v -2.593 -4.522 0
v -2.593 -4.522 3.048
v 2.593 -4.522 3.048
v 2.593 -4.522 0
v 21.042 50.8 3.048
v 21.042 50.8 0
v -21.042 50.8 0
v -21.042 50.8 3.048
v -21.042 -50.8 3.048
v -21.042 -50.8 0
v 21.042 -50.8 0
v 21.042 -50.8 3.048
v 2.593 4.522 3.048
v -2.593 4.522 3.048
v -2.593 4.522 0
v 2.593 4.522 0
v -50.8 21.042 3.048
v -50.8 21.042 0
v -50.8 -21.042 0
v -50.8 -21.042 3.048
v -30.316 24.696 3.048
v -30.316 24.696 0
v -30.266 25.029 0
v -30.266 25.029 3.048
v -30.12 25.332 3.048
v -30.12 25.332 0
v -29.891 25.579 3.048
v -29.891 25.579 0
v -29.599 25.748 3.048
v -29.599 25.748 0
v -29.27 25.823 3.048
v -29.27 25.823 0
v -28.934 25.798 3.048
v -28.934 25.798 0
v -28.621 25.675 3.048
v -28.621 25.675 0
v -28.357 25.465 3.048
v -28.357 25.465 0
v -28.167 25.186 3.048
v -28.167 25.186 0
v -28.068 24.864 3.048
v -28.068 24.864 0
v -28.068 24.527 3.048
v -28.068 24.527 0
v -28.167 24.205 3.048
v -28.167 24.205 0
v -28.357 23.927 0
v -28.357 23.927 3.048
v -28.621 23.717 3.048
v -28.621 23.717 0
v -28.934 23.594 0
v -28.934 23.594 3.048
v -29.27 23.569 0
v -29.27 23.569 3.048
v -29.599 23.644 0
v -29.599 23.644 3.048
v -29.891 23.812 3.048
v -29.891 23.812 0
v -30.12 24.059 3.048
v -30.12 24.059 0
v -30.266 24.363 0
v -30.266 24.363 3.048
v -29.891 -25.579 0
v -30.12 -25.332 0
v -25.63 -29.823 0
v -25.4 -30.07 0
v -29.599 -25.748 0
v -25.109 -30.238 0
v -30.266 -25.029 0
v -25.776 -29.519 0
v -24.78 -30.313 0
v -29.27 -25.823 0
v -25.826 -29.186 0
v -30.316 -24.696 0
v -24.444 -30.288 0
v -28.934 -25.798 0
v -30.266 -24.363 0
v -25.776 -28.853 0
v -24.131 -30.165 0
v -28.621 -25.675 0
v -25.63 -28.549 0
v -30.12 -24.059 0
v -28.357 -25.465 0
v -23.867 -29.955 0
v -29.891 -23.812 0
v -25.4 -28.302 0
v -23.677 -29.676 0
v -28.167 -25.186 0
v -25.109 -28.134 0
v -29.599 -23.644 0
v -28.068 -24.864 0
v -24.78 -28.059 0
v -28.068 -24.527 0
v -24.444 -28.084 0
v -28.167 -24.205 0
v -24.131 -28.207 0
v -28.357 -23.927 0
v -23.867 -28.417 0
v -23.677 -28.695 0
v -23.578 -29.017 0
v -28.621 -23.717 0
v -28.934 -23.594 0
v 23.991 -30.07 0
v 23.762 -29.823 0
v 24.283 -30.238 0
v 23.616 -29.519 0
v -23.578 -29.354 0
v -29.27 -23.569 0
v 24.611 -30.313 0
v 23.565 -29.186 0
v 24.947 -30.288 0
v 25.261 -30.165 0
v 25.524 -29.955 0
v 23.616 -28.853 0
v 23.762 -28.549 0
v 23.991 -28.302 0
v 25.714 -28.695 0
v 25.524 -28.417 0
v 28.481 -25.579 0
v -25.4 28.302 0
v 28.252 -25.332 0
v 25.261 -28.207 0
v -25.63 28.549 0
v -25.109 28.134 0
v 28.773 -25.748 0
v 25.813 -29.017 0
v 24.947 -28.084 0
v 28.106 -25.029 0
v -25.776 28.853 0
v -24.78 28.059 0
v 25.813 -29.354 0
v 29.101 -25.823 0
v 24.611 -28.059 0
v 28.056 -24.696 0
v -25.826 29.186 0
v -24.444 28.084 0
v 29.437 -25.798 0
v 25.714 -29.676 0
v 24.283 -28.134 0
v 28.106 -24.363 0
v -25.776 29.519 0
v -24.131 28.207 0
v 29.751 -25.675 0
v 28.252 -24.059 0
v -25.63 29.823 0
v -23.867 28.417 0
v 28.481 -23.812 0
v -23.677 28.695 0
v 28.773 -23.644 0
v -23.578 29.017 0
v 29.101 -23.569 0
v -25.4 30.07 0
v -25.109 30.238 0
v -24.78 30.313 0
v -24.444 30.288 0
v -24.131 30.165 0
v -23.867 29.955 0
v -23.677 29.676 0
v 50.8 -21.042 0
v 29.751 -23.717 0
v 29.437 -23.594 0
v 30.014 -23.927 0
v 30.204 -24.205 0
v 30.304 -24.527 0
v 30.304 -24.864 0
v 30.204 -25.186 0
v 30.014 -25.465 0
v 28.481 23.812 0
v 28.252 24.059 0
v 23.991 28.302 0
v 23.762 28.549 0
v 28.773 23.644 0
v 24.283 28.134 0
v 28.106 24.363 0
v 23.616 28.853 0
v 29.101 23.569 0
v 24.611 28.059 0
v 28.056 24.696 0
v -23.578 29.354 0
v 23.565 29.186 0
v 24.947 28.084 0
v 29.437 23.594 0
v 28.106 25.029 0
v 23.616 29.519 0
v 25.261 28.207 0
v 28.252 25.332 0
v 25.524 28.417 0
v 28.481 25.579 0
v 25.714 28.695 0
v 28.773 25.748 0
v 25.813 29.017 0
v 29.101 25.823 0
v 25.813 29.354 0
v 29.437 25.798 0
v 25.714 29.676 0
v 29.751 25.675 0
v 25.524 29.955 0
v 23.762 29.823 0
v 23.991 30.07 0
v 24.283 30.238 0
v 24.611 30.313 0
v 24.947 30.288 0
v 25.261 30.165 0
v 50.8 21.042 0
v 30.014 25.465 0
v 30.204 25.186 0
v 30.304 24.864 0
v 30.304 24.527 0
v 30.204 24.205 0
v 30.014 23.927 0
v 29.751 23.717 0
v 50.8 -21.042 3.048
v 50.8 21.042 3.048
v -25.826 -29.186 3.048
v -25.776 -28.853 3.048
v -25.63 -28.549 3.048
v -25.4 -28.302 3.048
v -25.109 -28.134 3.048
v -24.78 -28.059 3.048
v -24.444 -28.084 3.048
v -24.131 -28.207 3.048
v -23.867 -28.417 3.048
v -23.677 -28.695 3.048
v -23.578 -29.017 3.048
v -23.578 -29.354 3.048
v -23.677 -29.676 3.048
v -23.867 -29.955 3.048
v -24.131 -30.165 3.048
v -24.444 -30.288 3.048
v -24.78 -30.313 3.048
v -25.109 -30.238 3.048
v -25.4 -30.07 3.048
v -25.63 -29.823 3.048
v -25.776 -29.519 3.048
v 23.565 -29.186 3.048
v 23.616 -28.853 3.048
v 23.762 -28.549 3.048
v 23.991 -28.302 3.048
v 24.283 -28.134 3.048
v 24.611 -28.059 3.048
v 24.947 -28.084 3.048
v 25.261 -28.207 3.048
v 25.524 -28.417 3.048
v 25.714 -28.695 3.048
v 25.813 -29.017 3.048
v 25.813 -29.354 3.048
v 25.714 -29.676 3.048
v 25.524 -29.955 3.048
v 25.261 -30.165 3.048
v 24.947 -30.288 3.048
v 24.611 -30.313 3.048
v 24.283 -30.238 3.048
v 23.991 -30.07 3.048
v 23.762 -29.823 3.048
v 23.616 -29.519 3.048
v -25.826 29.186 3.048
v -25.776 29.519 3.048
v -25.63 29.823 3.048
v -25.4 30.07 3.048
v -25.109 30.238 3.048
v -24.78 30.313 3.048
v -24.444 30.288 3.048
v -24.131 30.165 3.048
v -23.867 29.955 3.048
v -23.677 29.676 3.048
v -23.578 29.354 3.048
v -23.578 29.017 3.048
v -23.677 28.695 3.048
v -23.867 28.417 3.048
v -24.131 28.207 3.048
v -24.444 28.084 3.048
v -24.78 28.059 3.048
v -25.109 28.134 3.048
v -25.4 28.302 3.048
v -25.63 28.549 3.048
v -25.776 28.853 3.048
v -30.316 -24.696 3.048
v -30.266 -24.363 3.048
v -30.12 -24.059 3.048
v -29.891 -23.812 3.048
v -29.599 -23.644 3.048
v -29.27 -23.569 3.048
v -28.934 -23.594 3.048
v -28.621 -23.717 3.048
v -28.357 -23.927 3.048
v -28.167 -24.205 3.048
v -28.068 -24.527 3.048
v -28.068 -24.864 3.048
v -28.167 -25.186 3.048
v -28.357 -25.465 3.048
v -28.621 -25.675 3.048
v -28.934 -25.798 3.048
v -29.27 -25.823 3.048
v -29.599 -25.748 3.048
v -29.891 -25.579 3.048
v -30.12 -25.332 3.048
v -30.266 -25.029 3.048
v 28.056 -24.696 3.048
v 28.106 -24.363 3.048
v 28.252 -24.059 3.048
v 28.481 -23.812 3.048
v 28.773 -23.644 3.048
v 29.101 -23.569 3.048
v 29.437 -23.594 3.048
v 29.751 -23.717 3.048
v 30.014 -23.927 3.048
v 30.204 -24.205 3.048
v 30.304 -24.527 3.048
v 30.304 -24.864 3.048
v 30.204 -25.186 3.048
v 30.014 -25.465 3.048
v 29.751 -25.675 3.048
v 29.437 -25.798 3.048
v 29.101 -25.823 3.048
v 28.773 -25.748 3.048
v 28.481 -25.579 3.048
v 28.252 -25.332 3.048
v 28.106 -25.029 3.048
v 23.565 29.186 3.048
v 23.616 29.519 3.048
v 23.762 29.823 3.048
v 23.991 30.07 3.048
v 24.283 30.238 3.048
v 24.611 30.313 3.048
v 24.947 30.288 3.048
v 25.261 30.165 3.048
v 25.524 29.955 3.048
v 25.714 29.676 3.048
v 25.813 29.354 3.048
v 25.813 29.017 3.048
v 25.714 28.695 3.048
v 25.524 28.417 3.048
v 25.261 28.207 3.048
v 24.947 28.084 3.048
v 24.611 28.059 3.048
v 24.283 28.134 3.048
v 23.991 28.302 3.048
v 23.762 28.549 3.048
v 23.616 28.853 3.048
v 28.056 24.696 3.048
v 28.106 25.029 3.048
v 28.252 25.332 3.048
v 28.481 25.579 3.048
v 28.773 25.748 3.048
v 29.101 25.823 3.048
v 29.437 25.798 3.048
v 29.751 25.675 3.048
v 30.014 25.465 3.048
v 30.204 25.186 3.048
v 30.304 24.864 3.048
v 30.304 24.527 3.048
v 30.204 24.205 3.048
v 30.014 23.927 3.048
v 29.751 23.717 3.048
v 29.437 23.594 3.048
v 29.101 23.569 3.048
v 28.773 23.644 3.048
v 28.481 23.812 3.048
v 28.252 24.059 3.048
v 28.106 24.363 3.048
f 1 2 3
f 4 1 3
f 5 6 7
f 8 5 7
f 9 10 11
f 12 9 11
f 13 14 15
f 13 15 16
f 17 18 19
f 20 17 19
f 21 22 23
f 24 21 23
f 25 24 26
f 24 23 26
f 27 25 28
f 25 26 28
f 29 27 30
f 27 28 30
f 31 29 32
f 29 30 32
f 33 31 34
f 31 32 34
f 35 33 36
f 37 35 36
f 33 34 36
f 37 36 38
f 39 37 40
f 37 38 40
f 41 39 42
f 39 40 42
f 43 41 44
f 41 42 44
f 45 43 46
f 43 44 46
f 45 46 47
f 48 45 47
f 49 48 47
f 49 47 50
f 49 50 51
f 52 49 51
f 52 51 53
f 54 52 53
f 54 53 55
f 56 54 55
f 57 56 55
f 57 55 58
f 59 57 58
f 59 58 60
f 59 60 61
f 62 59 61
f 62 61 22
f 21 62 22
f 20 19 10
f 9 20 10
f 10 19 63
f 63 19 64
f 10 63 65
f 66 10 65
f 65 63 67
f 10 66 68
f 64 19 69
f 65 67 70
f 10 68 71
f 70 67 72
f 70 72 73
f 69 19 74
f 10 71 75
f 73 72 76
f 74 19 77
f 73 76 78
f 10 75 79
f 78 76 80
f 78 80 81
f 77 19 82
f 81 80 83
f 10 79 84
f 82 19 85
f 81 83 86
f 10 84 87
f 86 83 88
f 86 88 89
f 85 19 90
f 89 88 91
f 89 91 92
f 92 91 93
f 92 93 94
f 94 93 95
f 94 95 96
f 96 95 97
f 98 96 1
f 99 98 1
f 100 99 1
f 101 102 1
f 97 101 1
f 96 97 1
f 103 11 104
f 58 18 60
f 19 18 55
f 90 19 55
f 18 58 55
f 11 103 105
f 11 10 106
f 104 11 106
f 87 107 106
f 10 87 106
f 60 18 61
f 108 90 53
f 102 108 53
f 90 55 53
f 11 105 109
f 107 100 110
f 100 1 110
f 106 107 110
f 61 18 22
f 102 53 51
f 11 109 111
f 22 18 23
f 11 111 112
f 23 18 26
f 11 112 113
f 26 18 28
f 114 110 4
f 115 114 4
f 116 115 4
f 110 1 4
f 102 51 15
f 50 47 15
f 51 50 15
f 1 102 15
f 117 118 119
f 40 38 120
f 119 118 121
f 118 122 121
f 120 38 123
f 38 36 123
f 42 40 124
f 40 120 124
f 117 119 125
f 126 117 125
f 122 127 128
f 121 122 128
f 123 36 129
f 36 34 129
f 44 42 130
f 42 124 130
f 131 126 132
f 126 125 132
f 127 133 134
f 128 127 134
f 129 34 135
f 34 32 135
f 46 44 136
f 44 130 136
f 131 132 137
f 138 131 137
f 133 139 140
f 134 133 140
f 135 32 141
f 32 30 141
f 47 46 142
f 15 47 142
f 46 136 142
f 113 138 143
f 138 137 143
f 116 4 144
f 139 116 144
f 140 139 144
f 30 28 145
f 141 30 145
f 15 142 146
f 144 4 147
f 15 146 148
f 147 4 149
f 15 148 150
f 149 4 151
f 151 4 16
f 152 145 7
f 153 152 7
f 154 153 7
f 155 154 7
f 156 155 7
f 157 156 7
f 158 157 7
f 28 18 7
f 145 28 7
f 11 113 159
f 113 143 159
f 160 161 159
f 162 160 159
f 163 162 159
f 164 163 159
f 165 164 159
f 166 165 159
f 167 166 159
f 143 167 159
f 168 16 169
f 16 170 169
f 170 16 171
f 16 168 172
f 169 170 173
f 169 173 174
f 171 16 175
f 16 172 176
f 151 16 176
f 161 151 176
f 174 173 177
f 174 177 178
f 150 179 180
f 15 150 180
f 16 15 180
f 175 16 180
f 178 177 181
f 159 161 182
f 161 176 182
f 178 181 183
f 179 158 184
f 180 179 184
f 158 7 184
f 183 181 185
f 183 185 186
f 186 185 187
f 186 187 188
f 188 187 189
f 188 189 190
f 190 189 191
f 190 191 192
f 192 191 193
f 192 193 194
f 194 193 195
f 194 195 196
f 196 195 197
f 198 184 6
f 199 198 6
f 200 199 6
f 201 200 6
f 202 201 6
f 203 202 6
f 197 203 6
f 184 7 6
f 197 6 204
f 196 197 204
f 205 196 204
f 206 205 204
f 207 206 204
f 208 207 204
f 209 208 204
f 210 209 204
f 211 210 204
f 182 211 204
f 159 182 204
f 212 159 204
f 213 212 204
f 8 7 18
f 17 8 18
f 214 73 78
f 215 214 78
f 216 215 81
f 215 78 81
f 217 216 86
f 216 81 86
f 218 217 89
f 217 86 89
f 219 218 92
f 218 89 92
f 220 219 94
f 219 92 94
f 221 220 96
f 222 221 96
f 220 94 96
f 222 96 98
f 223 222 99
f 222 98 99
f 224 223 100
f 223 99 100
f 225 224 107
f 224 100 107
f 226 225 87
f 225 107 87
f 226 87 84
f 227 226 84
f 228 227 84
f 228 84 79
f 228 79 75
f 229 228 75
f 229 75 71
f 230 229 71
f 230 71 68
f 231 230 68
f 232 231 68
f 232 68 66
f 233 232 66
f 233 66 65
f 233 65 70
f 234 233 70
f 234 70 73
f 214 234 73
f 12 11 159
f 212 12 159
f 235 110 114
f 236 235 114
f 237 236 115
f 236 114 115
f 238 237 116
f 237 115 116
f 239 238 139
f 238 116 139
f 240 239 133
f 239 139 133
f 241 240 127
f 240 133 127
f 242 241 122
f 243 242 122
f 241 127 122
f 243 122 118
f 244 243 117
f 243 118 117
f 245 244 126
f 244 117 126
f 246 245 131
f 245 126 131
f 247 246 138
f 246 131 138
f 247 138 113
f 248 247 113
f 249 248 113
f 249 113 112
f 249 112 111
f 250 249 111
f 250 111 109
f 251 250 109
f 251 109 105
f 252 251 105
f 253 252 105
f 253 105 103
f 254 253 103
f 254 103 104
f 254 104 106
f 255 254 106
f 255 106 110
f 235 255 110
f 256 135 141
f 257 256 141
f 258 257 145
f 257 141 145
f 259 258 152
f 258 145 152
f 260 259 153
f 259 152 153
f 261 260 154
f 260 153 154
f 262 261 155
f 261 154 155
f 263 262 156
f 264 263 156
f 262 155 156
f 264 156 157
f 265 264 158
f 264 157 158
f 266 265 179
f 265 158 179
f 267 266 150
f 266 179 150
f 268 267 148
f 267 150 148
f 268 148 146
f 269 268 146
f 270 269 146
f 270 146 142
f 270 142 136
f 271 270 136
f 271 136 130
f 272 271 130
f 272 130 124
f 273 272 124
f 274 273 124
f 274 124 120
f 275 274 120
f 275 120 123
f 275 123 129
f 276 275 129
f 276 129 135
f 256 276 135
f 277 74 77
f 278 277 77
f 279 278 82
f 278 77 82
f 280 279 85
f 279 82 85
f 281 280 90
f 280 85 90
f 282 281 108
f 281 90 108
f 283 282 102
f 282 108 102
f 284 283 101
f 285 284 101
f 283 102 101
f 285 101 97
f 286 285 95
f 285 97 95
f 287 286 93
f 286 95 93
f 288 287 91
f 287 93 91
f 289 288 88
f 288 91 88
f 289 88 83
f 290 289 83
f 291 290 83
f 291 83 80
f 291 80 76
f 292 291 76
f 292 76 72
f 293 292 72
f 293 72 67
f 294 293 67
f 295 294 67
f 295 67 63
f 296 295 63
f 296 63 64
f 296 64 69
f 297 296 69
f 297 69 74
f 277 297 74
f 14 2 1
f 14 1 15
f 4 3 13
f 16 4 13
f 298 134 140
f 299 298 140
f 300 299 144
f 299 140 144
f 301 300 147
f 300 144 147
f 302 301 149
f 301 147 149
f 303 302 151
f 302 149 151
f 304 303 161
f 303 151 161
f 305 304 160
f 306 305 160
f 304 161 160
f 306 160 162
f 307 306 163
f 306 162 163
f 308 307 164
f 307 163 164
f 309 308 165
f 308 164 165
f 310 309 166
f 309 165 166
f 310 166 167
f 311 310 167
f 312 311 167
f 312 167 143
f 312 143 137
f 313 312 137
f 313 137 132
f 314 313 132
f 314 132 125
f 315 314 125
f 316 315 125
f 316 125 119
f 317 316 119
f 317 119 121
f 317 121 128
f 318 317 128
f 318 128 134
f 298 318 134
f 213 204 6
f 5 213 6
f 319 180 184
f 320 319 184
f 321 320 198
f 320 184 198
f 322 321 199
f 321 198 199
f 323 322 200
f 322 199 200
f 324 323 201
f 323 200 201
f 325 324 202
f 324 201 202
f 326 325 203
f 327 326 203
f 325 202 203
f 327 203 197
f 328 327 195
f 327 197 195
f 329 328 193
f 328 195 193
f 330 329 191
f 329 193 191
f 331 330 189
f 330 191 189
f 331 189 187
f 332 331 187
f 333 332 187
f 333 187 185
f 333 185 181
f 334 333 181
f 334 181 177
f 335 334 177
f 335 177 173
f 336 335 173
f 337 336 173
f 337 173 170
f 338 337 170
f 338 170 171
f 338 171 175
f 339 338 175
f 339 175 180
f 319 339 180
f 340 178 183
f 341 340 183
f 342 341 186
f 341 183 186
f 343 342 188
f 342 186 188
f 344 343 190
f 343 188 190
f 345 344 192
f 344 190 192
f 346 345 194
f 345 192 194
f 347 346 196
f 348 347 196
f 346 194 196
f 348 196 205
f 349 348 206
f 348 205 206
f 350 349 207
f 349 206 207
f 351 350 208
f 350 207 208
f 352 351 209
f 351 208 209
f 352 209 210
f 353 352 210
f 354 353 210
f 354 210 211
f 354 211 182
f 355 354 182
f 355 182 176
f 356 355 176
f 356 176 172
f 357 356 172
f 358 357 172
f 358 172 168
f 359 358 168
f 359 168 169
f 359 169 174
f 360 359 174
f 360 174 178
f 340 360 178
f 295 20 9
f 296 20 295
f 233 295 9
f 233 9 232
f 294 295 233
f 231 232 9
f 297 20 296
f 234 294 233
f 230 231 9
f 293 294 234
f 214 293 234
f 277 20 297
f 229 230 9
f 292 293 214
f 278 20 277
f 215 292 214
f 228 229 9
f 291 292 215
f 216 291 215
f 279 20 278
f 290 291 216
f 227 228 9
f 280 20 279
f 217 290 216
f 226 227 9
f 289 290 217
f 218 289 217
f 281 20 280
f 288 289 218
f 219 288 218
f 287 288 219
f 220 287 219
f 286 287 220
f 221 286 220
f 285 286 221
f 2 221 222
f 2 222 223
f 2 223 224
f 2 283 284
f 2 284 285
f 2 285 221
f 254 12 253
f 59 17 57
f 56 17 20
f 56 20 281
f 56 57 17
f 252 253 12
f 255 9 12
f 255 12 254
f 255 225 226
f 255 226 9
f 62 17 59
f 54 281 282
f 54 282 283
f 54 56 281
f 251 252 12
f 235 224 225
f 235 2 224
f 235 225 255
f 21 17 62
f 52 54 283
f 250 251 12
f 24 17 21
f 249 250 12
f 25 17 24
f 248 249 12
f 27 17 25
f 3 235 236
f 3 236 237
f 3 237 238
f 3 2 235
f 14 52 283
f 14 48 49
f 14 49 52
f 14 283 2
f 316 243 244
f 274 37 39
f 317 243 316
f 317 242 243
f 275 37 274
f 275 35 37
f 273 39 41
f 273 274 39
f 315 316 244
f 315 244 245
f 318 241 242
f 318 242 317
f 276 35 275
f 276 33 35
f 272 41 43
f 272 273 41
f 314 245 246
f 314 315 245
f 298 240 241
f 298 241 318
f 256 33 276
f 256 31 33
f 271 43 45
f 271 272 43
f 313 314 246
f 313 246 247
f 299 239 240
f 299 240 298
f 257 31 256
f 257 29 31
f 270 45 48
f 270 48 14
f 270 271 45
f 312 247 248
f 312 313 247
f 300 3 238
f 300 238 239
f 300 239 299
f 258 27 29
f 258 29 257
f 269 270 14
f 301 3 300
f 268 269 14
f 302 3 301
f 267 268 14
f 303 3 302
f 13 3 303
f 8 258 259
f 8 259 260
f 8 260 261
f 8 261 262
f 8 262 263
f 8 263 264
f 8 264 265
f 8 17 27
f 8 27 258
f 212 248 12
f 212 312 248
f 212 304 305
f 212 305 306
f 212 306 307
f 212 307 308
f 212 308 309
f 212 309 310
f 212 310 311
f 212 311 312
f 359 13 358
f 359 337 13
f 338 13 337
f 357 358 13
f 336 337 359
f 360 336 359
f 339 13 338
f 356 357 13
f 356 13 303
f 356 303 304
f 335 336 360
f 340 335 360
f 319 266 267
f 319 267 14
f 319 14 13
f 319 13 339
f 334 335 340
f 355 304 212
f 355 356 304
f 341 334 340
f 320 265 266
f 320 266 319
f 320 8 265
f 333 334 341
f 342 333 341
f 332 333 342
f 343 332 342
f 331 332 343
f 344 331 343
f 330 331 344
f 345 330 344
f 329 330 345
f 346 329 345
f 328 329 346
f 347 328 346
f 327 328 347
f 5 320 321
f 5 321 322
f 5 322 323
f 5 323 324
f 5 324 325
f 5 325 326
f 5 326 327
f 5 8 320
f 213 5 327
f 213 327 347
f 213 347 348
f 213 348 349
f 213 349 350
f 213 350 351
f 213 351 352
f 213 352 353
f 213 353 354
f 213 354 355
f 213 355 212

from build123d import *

# Parameters (mm, degrees)
F1_DEPTH = 3.048
F3_D     = 2.2606
F4_W     = 5.1865465939
F4_H     = 9.0437950566
F5_DEPTH = 25.4


with BuildPart() as f1:
    # F0 (on Top) → F1 (new body)
    with BuildSketch(Plane.XY):
        Polygon((21.0420489686, 50.8), (-21.0420489686, 50.8), (-50.8, 21.0420489686), (-50.8, -21.0420489686), (-21.0420489686, -50.8), (21.0420489686, -50.8), (50.8, -21.0420489686), (50.8, 21.0420489686), align=None)
    extrude(amount=F1_DEPTH)

    # F3 (through all)
    with Locations(Plane.XY.offset(3.048)):
        with Locations((-24.6957043329, 29.1858323935), (-29.1858323935, 24.6957043329), (-29.1858323935, -24.6957043329), (-24.6957043329, -29.1858323935), (24.6957043329, -29.1858323935), (29.1858323935, -24.6957043329), (29.1858323935, 24.6957043329), (24.6957043329, 29.1858323935)):
            Hole(F3_D / 2)

    # F4 (on face) → F5 (cut)
    with BuildSketch(Plane.XY.offset(3.048)):
        Rectangle(F4_W, F4_H)
    extrude(amount=-F5_DEPTH, mode=Mode.SUBTRACT)


solid = f1.part
